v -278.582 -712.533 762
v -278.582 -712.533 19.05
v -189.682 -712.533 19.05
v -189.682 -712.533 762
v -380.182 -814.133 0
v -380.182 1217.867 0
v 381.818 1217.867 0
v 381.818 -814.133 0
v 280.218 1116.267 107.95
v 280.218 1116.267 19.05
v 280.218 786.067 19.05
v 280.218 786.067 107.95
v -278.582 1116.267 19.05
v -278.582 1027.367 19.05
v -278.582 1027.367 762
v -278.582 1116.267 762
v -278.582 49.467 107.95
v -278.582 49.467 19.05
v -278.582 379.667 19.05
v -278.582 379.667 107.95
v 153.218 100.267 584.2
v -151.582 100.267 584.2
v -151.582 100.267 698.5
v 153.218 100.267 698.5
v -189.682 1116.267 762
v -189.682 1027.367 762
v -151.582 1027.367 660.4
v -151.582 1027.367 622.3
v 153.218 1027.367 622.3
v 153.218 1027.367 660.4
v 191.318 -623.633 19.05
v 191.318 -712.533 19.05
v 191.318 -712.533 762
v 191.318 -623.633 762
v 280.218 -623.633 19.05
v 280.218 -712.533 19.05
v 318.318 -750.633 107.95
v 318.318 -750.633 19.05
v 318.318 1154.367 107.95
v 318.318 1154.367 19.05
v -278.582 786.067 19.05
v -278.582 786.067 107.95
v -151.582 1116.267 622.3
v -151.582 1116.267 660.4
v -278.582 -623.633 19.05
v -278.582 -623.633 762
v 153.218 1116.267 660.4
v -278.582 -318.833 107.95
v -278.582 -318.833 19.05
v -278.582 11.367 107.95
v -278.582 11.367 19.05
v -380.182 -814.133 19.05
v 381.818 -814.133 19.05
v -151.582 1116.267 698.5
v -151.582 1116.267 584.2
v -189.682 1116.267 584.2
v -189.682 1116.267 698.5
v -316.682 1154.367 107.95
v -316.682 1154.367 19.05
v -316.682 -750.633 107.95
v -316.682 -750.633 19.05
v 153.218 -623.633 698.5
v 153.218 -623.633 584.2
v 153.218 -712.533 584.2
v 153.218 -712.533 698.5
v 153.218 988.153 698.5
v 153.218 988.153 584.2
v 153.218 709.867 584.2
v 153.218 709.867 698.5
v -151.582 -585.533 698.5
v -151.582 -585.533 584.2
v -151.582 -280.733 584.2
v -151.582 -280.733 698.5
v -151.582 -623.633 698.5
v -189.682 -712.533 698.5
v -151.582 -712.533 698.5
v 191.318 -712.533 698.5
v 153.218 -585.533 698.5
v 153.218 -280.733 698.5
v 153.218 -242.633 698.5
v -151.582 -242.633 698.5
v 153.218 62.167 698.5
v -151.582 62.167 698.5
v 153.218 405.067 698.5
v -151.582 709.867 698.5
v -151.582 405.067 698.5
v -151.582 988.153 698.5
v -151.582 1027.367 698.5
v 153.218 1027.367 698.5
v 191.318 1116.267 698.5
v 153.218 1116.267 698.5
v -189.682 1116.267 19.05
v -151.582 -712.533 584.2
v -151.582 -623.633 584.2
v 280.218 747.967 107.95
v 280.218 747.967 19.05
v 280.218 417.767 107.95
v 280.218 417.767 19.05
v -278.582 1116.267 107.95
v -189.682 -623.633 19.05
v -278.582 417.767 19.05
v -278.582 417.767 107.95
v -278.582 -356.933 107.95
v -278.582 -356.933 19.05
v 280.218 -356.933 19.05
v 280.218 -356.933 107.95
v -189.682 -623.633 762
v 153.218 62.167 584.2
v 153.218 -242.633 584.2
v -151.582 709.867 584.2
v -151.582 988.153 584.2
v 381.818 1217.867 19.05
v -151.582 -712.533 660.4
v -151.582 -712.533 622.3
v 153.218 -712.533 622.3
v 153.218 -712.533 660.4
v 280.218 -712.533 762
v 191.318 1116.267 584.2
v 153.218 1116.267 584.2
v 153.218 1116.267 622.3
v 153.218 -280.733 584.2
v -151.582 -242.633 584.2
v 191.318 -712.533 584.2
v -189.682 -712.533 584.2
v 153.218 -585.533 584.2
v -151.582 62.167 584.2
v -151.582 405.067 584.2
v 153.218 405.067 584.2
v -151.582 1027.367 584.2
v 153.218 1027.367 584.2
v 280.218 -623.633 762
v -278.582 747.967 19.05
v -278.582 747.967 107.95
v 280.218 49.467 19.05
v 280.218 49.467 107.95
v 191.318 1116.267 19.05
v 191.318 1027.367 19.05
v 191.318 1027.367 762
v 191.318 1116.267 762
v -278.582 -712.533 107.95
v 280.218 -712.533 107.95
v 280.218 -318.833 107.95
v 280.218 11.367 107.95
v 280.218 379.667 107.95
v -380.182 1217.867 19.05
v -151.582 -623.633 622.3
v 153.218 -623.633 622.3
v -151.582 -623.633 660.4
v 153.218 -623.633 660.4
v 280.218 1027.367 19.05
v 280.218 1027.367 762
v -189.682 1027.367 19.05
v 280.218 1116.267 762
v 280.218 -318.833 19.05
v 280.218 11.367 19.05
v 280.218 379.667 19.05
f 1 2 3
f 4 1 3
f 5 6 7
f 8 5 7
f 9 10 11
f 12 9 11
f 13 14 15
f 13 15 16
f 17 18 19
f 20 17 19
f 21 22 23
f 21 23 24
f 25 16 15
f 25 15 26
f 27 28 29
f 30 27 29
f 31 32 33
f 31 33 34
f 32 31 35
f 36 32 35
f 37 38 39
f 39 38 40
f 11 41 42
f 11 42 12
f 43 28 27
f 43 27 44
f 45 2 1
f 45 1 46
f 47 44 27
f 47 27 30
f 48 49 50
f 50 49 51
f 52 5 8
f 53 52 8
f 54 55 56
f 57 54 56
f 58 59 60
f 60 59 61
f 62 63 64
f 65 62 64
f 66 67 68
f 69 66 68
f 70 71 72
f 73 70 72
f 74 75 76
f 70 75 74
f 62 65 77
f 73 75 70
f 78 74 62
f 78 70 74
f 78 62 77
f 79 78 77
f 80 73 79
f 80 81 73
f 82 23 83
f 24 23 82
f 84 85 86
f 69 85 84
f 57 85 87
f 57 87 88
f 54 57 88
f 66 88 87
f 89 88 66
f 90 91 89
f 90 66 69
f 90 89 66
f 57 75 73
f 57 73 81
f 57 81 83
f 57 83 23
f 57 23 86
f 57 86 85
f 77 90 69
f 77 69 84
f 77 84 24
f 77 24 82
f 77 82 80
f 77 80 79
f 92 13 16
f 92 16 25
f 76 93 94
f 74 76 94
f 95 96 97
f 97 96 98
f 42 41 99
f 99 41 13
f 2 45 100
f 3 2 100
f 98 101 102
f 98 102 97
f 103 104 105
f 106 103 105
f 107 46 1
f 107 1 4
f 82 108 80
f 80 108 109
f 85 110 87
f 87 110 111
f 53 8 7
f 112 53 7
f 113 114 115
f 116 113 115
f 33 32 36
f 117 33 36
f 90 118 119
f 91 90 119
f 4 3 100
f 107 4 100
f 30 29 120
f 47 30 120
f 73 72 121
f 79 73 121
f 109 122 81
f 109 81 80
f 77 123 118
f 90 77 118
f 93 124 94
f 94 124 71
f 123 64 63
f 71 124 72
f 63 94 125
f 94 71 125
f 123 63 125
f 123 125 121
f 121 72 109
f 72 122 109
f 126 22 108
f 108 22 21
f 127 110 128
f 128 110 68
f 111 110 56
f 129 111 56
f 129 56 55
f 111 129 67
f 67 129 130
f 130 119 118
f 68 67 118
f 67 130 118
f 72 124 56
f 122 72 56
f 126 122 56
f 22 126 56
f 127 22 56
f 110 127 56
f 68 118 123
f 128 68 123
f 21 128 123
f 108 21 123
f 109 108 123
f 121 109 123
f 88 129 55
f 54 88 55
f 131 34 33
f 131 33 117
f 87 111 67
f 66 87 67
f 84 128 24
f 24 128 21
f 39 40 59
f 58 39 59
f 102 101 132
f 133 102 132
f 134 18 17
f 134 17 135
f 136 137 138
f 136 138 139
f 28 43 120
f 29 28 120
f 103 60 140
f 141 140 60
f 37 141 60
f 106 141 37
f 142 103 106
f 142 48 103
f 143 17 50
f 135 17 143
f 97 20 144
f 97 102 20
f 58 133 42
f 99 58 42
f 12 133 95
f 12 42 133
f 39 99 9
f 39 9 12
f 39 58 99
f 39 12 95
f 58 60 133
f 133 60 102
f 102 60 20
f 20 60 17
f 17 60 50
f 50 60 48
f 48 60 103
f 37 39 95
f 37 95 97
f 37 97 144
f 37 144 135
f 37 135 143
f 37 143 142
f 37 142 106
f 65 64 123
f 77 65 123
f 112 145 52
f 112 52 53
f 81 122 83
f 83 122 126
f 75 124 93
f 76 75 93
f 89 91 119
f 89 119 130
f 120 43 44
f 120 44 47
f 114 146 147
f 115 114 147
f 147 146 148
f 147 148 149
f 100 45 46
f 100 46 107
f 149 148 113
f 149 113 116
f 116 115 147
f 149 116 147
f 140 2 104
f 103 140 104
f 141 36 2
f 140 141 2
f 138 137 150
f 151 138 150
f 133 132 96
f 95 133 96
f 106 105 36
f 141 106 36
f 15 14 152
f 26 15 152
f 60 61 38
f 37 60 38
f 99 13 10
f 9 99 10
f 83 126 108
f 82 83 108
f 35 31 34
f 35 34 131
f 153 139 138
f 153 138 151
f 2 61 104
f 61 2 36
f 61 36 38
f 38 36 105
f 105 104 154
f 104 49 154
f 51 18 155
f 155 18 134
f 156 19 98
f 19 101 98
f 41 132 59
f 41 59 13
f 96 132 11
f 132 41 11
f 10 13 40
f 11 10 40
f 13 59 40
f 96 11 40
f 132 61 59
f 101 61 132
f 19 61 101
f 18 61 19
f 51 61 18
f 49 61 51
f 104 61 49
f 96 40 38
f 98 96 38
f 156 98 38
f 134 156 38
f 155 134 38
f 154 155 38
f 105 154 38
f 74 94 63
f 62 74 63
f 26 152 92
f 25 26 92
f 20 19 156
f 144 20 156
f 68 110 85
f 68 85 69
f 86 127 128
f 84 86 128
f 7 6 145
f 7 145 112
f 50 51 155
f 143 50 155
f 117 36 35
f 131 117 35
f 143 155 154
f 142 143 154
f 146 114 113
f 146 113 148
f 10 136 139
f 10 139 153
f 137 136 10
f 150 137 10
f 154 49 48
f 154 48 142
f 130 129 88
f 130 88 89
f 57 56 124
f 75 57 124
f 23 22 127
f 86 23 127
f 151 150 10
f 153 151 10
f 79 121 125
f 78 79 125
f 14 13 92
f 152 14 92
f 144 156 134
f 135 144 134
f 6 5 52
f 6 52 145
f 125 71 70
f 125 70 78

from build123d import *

# Parameters (mm, degrees)
F3_START = 584.2
F2_W     = 304.8
F2_H     = 39.2137783545
F2_H_2   = 266.7
F2_H_3   = 38.1
F3_DEPTH = 114.3
F0_W     = 762
F0_H     = 2032
F4_DEPTH = 19.05
F5_START = 19.05
F1_W     = 558.8
F1_H     = 38.1
F5_DEPTH = 88.9
F6_START = 19.05
F1_W_2   = 88.9
F1_H_2   = 88.9
F6_DEPTH = 742.95
F7_START = 622.3
F2_H_4   = 88.9
F7_DEPTH = 38.1


with BuildPart() as f3:
    # F2 (on face) → F3 (new body)
    with BuildSketch(Plane.XY.offset(F3_START)):
        Polygon((-151.5819020361, 1116.2670571821), (-189.6819020361, 1116.2670571821), (-189.6819020361, -712.5329428179), (-151.5819020361, -712.5329428179), (-151.5819020361, -623.6329428179), (-151.5819020361, -585.5329428179), (-151.5819020361, -280.7329428179), (-151.5819020361, -242.6329428179), (-151.5819020361, 62.1670571821), (-151.5819020361, 100.2670571821), (-151.5819020361, 405.0670571821), (-151.5819020361, 443.1670571821), (-151.5819020361, 709.8670571821), (-151.5819020361, 747.9670571821), (-151.5819020361, 988.1532788277), (-151.5819020361, 1027.3670571821), align=None)
        with Locations((0.8180979639, 1007.7601680049)):
            Rectangle(F2_W, F2_H)
        Polygon((191.3180979639, 1116.2670571821), (153.2180979639, 1116.2670571821), (153.2180979639, 1027.3670571821), (153.2180979639, 988.1532788277), (153.2180979639, 747.9670571821), (153.2180979639, 709.8670571821), (153.2180979639, 443.1670571821), (153.2180979639, 405.0670571821), (153.2180979639, 100.2670571821), (153.2180979639, 62.1670571821), (153.2180979639, -242.6329428179), (153.2180979639, -280.7329428179), (153.2180979639, -585.5329428179), (153.2180979639, -623.6329428179), (153.2180979639, -712.5329428179), (191.3180979639, -712.5329428179), align=None)
        with Locations((0.8180979639, 576.5170571821)):
            Rectangle(F2_W, F2_H_2)
        with Locations((0.8180979639, 424.1170571821)):
            Rectangle(F2_W, F2_H_3)
        with Locations((0.8180979639, 81.2170571821)):
            Rectangle(F2_W, F2_H_3)
        with Locations((0.8180979639, -261.6829428179)):
            Rectangle(F2_W, F2_H_3)
        with Locations((0.8180979639, -604.5829428179)):
            Rectangle(F2_W, F2_H_3)
    extrude(amount=F3_DEPTH)


with BuildPart() as f4:
    # F0 (on Top) → F4 (new body)
    with BuildSketch(Plane.XY):
        with Locations((0.8180979639, 201.8670571821)):
            Rectangle(F0_W, F0_H)
    extrude(amount=F4_DEPTH)


with BuildPart() as f5:
    # F1 (on face) → F5 (new body)
    with BuildSketch(Plane.XY.offset(F5_START)):
        Polygon((-278.5819020361, -750.6329428179), (-278.5819020361, -712.5329428179), (-278.5819020361, -623.6329428179), (-278.5819020361, -356.9329428179), (-278.5819020361, -318.8329428179), (-278.5819020361, 11.3670571821), (-278.5819020361, 49.4670571821), (-278.5819020361, 379.6670571821), (-278.5819020361, 417.7670571821), (-278.5819020361, 747.9670571821), (-278.5819020361, 786.0670571821), (-278.5819020361, 1027.3670571821), (-278.5819020361, 1116.2670571821), (-278.5819020361, 1154.3670571821), (-316.6819020361, 1154.3670571821), (-316.6819020361, -750.6329428179), align=None)
        Polygon((-189.6819020361, -712.5329428179), (-278.5819020361, -712.5329428179), (-278.5819020361, -750.6329428179), (280.2180979639, -750.6329428179), (280.2180979639, -712.5329428179), (191.3180979639, -712.5329428179), align=None)
        Polygon((280.2180979639, -712.5329428179), (280.2180979639, -750.6329428179), (318.3180979639, -750.6329428179), (318.3180979639, 1154.3670571821), (280.2180979639, 1154.3670571821), (280.2180979639, 1116.2670571821), (280.2180979639, 1027.3670571821), (280.2180979639, 786.0670571821), (280.2180979639, 747.9670571821), (280.2180979639, 417.7670571821), (280.2180979639, 379.6670571821), (280.2180979639, 49.4670571821), (280.2180979639, 11.3670571821), (280.2180979639, -318.8329428179), (280.2180979639, -356.9329428179), (280.2180979639, -623.6329428179), align=None)
        with Locations((0.8180979639, -337.8829428179)):
            Rectangle(F1_W, F1_H)
        with Locations((0.8180979639, 30.4170571821)):
            Rectangle(F1_W, F1_H)
        with Locations((0.8180979639, 398.7170571821)):
            Rectangle(F1_W, F1_H)
        with Locations((0.8180979639, 767.0170571821)):
            Rectangle(F1_W, F1_H)
        Polygon((280.2180979639, 1154.3670571821), (-278.5819020361, 1154.3670571821), (-278.5819020361, 1116.2670571821), (-189.6819020361, 1116.2670571821), (191.3180979639, 1116.2670571821), (280.2180979639, 1116.2670571821), align=None)
    extrude(amount=F5_DEPTH)


with BuildPart() as f6:
    # F1 (on face) → F6 (new body)
    with BuildSketch(Plane.XY.offset(F6_START)):
        with Locations((-234.1319020361, -668.0829428179)):
            Rectangle(F1_W_2, F1_H_2)
    extrude(amount=F6_DEPTH)


with BuildPart() as f6b:
    # F1 (on face) → F6, piece 2 (new body)
    with BuildSketch(Plane.XY.offset(F6_START)):
        with Locations((235.7680979639, -668.0829428179)):
            Rectangle(F1_W_2, F1_H_2)
    extrude(amount=F6_DEPTH)


with BuildPart() as f6c:
    # F1 (on face) → F6, piece 3 (new body)
    with BuildSketch(Plane.XY.offset(F6_START)):
        with Locations((235.7680979639, 1071.8170571821)):
            Rectangle(F1_W_2, F1_H_2)
    extrude(amount=F6_DEPTH)


with BuildPart() as f6d:
    # F1 (on face) → F6, piece 4 (new body)
    with BuildSketch(Plane.XY.offset(F6_START)):
        with Locations((-234.1319020361, 1071.8170571821)):
            Rectangle(F1_W_2, F1_H_2)
    extrude(amount=F6_DEPTH)


with BuildPart() as f7:
    # F2 (on face) → F7 (new body)
    with BuildSketch(Plane.XY.offset(F7_START)):
        with Locations((0.8180979639, -668.0829428179)):
            Rectangle(F2_W, F2_H_4)
    extrude(amount=F7_DEPTH)


with BuildPart() as f7b:
    # F2 (on face) → F7, piece 2 (new body)
    with BuildSketch(Plane.XY.offset(F7_START)):
        with Locations((0.8180979639, 1071.8170571821)):
            Rectangle(F2_W, F2_H_4)
    extrude(amount=F7_DEPTH)


solid = Compound([f3.part, f4.part, f5.part, f6.part, f6b.part, f6c.part, f6d.part, f7.part, f7b.part])
